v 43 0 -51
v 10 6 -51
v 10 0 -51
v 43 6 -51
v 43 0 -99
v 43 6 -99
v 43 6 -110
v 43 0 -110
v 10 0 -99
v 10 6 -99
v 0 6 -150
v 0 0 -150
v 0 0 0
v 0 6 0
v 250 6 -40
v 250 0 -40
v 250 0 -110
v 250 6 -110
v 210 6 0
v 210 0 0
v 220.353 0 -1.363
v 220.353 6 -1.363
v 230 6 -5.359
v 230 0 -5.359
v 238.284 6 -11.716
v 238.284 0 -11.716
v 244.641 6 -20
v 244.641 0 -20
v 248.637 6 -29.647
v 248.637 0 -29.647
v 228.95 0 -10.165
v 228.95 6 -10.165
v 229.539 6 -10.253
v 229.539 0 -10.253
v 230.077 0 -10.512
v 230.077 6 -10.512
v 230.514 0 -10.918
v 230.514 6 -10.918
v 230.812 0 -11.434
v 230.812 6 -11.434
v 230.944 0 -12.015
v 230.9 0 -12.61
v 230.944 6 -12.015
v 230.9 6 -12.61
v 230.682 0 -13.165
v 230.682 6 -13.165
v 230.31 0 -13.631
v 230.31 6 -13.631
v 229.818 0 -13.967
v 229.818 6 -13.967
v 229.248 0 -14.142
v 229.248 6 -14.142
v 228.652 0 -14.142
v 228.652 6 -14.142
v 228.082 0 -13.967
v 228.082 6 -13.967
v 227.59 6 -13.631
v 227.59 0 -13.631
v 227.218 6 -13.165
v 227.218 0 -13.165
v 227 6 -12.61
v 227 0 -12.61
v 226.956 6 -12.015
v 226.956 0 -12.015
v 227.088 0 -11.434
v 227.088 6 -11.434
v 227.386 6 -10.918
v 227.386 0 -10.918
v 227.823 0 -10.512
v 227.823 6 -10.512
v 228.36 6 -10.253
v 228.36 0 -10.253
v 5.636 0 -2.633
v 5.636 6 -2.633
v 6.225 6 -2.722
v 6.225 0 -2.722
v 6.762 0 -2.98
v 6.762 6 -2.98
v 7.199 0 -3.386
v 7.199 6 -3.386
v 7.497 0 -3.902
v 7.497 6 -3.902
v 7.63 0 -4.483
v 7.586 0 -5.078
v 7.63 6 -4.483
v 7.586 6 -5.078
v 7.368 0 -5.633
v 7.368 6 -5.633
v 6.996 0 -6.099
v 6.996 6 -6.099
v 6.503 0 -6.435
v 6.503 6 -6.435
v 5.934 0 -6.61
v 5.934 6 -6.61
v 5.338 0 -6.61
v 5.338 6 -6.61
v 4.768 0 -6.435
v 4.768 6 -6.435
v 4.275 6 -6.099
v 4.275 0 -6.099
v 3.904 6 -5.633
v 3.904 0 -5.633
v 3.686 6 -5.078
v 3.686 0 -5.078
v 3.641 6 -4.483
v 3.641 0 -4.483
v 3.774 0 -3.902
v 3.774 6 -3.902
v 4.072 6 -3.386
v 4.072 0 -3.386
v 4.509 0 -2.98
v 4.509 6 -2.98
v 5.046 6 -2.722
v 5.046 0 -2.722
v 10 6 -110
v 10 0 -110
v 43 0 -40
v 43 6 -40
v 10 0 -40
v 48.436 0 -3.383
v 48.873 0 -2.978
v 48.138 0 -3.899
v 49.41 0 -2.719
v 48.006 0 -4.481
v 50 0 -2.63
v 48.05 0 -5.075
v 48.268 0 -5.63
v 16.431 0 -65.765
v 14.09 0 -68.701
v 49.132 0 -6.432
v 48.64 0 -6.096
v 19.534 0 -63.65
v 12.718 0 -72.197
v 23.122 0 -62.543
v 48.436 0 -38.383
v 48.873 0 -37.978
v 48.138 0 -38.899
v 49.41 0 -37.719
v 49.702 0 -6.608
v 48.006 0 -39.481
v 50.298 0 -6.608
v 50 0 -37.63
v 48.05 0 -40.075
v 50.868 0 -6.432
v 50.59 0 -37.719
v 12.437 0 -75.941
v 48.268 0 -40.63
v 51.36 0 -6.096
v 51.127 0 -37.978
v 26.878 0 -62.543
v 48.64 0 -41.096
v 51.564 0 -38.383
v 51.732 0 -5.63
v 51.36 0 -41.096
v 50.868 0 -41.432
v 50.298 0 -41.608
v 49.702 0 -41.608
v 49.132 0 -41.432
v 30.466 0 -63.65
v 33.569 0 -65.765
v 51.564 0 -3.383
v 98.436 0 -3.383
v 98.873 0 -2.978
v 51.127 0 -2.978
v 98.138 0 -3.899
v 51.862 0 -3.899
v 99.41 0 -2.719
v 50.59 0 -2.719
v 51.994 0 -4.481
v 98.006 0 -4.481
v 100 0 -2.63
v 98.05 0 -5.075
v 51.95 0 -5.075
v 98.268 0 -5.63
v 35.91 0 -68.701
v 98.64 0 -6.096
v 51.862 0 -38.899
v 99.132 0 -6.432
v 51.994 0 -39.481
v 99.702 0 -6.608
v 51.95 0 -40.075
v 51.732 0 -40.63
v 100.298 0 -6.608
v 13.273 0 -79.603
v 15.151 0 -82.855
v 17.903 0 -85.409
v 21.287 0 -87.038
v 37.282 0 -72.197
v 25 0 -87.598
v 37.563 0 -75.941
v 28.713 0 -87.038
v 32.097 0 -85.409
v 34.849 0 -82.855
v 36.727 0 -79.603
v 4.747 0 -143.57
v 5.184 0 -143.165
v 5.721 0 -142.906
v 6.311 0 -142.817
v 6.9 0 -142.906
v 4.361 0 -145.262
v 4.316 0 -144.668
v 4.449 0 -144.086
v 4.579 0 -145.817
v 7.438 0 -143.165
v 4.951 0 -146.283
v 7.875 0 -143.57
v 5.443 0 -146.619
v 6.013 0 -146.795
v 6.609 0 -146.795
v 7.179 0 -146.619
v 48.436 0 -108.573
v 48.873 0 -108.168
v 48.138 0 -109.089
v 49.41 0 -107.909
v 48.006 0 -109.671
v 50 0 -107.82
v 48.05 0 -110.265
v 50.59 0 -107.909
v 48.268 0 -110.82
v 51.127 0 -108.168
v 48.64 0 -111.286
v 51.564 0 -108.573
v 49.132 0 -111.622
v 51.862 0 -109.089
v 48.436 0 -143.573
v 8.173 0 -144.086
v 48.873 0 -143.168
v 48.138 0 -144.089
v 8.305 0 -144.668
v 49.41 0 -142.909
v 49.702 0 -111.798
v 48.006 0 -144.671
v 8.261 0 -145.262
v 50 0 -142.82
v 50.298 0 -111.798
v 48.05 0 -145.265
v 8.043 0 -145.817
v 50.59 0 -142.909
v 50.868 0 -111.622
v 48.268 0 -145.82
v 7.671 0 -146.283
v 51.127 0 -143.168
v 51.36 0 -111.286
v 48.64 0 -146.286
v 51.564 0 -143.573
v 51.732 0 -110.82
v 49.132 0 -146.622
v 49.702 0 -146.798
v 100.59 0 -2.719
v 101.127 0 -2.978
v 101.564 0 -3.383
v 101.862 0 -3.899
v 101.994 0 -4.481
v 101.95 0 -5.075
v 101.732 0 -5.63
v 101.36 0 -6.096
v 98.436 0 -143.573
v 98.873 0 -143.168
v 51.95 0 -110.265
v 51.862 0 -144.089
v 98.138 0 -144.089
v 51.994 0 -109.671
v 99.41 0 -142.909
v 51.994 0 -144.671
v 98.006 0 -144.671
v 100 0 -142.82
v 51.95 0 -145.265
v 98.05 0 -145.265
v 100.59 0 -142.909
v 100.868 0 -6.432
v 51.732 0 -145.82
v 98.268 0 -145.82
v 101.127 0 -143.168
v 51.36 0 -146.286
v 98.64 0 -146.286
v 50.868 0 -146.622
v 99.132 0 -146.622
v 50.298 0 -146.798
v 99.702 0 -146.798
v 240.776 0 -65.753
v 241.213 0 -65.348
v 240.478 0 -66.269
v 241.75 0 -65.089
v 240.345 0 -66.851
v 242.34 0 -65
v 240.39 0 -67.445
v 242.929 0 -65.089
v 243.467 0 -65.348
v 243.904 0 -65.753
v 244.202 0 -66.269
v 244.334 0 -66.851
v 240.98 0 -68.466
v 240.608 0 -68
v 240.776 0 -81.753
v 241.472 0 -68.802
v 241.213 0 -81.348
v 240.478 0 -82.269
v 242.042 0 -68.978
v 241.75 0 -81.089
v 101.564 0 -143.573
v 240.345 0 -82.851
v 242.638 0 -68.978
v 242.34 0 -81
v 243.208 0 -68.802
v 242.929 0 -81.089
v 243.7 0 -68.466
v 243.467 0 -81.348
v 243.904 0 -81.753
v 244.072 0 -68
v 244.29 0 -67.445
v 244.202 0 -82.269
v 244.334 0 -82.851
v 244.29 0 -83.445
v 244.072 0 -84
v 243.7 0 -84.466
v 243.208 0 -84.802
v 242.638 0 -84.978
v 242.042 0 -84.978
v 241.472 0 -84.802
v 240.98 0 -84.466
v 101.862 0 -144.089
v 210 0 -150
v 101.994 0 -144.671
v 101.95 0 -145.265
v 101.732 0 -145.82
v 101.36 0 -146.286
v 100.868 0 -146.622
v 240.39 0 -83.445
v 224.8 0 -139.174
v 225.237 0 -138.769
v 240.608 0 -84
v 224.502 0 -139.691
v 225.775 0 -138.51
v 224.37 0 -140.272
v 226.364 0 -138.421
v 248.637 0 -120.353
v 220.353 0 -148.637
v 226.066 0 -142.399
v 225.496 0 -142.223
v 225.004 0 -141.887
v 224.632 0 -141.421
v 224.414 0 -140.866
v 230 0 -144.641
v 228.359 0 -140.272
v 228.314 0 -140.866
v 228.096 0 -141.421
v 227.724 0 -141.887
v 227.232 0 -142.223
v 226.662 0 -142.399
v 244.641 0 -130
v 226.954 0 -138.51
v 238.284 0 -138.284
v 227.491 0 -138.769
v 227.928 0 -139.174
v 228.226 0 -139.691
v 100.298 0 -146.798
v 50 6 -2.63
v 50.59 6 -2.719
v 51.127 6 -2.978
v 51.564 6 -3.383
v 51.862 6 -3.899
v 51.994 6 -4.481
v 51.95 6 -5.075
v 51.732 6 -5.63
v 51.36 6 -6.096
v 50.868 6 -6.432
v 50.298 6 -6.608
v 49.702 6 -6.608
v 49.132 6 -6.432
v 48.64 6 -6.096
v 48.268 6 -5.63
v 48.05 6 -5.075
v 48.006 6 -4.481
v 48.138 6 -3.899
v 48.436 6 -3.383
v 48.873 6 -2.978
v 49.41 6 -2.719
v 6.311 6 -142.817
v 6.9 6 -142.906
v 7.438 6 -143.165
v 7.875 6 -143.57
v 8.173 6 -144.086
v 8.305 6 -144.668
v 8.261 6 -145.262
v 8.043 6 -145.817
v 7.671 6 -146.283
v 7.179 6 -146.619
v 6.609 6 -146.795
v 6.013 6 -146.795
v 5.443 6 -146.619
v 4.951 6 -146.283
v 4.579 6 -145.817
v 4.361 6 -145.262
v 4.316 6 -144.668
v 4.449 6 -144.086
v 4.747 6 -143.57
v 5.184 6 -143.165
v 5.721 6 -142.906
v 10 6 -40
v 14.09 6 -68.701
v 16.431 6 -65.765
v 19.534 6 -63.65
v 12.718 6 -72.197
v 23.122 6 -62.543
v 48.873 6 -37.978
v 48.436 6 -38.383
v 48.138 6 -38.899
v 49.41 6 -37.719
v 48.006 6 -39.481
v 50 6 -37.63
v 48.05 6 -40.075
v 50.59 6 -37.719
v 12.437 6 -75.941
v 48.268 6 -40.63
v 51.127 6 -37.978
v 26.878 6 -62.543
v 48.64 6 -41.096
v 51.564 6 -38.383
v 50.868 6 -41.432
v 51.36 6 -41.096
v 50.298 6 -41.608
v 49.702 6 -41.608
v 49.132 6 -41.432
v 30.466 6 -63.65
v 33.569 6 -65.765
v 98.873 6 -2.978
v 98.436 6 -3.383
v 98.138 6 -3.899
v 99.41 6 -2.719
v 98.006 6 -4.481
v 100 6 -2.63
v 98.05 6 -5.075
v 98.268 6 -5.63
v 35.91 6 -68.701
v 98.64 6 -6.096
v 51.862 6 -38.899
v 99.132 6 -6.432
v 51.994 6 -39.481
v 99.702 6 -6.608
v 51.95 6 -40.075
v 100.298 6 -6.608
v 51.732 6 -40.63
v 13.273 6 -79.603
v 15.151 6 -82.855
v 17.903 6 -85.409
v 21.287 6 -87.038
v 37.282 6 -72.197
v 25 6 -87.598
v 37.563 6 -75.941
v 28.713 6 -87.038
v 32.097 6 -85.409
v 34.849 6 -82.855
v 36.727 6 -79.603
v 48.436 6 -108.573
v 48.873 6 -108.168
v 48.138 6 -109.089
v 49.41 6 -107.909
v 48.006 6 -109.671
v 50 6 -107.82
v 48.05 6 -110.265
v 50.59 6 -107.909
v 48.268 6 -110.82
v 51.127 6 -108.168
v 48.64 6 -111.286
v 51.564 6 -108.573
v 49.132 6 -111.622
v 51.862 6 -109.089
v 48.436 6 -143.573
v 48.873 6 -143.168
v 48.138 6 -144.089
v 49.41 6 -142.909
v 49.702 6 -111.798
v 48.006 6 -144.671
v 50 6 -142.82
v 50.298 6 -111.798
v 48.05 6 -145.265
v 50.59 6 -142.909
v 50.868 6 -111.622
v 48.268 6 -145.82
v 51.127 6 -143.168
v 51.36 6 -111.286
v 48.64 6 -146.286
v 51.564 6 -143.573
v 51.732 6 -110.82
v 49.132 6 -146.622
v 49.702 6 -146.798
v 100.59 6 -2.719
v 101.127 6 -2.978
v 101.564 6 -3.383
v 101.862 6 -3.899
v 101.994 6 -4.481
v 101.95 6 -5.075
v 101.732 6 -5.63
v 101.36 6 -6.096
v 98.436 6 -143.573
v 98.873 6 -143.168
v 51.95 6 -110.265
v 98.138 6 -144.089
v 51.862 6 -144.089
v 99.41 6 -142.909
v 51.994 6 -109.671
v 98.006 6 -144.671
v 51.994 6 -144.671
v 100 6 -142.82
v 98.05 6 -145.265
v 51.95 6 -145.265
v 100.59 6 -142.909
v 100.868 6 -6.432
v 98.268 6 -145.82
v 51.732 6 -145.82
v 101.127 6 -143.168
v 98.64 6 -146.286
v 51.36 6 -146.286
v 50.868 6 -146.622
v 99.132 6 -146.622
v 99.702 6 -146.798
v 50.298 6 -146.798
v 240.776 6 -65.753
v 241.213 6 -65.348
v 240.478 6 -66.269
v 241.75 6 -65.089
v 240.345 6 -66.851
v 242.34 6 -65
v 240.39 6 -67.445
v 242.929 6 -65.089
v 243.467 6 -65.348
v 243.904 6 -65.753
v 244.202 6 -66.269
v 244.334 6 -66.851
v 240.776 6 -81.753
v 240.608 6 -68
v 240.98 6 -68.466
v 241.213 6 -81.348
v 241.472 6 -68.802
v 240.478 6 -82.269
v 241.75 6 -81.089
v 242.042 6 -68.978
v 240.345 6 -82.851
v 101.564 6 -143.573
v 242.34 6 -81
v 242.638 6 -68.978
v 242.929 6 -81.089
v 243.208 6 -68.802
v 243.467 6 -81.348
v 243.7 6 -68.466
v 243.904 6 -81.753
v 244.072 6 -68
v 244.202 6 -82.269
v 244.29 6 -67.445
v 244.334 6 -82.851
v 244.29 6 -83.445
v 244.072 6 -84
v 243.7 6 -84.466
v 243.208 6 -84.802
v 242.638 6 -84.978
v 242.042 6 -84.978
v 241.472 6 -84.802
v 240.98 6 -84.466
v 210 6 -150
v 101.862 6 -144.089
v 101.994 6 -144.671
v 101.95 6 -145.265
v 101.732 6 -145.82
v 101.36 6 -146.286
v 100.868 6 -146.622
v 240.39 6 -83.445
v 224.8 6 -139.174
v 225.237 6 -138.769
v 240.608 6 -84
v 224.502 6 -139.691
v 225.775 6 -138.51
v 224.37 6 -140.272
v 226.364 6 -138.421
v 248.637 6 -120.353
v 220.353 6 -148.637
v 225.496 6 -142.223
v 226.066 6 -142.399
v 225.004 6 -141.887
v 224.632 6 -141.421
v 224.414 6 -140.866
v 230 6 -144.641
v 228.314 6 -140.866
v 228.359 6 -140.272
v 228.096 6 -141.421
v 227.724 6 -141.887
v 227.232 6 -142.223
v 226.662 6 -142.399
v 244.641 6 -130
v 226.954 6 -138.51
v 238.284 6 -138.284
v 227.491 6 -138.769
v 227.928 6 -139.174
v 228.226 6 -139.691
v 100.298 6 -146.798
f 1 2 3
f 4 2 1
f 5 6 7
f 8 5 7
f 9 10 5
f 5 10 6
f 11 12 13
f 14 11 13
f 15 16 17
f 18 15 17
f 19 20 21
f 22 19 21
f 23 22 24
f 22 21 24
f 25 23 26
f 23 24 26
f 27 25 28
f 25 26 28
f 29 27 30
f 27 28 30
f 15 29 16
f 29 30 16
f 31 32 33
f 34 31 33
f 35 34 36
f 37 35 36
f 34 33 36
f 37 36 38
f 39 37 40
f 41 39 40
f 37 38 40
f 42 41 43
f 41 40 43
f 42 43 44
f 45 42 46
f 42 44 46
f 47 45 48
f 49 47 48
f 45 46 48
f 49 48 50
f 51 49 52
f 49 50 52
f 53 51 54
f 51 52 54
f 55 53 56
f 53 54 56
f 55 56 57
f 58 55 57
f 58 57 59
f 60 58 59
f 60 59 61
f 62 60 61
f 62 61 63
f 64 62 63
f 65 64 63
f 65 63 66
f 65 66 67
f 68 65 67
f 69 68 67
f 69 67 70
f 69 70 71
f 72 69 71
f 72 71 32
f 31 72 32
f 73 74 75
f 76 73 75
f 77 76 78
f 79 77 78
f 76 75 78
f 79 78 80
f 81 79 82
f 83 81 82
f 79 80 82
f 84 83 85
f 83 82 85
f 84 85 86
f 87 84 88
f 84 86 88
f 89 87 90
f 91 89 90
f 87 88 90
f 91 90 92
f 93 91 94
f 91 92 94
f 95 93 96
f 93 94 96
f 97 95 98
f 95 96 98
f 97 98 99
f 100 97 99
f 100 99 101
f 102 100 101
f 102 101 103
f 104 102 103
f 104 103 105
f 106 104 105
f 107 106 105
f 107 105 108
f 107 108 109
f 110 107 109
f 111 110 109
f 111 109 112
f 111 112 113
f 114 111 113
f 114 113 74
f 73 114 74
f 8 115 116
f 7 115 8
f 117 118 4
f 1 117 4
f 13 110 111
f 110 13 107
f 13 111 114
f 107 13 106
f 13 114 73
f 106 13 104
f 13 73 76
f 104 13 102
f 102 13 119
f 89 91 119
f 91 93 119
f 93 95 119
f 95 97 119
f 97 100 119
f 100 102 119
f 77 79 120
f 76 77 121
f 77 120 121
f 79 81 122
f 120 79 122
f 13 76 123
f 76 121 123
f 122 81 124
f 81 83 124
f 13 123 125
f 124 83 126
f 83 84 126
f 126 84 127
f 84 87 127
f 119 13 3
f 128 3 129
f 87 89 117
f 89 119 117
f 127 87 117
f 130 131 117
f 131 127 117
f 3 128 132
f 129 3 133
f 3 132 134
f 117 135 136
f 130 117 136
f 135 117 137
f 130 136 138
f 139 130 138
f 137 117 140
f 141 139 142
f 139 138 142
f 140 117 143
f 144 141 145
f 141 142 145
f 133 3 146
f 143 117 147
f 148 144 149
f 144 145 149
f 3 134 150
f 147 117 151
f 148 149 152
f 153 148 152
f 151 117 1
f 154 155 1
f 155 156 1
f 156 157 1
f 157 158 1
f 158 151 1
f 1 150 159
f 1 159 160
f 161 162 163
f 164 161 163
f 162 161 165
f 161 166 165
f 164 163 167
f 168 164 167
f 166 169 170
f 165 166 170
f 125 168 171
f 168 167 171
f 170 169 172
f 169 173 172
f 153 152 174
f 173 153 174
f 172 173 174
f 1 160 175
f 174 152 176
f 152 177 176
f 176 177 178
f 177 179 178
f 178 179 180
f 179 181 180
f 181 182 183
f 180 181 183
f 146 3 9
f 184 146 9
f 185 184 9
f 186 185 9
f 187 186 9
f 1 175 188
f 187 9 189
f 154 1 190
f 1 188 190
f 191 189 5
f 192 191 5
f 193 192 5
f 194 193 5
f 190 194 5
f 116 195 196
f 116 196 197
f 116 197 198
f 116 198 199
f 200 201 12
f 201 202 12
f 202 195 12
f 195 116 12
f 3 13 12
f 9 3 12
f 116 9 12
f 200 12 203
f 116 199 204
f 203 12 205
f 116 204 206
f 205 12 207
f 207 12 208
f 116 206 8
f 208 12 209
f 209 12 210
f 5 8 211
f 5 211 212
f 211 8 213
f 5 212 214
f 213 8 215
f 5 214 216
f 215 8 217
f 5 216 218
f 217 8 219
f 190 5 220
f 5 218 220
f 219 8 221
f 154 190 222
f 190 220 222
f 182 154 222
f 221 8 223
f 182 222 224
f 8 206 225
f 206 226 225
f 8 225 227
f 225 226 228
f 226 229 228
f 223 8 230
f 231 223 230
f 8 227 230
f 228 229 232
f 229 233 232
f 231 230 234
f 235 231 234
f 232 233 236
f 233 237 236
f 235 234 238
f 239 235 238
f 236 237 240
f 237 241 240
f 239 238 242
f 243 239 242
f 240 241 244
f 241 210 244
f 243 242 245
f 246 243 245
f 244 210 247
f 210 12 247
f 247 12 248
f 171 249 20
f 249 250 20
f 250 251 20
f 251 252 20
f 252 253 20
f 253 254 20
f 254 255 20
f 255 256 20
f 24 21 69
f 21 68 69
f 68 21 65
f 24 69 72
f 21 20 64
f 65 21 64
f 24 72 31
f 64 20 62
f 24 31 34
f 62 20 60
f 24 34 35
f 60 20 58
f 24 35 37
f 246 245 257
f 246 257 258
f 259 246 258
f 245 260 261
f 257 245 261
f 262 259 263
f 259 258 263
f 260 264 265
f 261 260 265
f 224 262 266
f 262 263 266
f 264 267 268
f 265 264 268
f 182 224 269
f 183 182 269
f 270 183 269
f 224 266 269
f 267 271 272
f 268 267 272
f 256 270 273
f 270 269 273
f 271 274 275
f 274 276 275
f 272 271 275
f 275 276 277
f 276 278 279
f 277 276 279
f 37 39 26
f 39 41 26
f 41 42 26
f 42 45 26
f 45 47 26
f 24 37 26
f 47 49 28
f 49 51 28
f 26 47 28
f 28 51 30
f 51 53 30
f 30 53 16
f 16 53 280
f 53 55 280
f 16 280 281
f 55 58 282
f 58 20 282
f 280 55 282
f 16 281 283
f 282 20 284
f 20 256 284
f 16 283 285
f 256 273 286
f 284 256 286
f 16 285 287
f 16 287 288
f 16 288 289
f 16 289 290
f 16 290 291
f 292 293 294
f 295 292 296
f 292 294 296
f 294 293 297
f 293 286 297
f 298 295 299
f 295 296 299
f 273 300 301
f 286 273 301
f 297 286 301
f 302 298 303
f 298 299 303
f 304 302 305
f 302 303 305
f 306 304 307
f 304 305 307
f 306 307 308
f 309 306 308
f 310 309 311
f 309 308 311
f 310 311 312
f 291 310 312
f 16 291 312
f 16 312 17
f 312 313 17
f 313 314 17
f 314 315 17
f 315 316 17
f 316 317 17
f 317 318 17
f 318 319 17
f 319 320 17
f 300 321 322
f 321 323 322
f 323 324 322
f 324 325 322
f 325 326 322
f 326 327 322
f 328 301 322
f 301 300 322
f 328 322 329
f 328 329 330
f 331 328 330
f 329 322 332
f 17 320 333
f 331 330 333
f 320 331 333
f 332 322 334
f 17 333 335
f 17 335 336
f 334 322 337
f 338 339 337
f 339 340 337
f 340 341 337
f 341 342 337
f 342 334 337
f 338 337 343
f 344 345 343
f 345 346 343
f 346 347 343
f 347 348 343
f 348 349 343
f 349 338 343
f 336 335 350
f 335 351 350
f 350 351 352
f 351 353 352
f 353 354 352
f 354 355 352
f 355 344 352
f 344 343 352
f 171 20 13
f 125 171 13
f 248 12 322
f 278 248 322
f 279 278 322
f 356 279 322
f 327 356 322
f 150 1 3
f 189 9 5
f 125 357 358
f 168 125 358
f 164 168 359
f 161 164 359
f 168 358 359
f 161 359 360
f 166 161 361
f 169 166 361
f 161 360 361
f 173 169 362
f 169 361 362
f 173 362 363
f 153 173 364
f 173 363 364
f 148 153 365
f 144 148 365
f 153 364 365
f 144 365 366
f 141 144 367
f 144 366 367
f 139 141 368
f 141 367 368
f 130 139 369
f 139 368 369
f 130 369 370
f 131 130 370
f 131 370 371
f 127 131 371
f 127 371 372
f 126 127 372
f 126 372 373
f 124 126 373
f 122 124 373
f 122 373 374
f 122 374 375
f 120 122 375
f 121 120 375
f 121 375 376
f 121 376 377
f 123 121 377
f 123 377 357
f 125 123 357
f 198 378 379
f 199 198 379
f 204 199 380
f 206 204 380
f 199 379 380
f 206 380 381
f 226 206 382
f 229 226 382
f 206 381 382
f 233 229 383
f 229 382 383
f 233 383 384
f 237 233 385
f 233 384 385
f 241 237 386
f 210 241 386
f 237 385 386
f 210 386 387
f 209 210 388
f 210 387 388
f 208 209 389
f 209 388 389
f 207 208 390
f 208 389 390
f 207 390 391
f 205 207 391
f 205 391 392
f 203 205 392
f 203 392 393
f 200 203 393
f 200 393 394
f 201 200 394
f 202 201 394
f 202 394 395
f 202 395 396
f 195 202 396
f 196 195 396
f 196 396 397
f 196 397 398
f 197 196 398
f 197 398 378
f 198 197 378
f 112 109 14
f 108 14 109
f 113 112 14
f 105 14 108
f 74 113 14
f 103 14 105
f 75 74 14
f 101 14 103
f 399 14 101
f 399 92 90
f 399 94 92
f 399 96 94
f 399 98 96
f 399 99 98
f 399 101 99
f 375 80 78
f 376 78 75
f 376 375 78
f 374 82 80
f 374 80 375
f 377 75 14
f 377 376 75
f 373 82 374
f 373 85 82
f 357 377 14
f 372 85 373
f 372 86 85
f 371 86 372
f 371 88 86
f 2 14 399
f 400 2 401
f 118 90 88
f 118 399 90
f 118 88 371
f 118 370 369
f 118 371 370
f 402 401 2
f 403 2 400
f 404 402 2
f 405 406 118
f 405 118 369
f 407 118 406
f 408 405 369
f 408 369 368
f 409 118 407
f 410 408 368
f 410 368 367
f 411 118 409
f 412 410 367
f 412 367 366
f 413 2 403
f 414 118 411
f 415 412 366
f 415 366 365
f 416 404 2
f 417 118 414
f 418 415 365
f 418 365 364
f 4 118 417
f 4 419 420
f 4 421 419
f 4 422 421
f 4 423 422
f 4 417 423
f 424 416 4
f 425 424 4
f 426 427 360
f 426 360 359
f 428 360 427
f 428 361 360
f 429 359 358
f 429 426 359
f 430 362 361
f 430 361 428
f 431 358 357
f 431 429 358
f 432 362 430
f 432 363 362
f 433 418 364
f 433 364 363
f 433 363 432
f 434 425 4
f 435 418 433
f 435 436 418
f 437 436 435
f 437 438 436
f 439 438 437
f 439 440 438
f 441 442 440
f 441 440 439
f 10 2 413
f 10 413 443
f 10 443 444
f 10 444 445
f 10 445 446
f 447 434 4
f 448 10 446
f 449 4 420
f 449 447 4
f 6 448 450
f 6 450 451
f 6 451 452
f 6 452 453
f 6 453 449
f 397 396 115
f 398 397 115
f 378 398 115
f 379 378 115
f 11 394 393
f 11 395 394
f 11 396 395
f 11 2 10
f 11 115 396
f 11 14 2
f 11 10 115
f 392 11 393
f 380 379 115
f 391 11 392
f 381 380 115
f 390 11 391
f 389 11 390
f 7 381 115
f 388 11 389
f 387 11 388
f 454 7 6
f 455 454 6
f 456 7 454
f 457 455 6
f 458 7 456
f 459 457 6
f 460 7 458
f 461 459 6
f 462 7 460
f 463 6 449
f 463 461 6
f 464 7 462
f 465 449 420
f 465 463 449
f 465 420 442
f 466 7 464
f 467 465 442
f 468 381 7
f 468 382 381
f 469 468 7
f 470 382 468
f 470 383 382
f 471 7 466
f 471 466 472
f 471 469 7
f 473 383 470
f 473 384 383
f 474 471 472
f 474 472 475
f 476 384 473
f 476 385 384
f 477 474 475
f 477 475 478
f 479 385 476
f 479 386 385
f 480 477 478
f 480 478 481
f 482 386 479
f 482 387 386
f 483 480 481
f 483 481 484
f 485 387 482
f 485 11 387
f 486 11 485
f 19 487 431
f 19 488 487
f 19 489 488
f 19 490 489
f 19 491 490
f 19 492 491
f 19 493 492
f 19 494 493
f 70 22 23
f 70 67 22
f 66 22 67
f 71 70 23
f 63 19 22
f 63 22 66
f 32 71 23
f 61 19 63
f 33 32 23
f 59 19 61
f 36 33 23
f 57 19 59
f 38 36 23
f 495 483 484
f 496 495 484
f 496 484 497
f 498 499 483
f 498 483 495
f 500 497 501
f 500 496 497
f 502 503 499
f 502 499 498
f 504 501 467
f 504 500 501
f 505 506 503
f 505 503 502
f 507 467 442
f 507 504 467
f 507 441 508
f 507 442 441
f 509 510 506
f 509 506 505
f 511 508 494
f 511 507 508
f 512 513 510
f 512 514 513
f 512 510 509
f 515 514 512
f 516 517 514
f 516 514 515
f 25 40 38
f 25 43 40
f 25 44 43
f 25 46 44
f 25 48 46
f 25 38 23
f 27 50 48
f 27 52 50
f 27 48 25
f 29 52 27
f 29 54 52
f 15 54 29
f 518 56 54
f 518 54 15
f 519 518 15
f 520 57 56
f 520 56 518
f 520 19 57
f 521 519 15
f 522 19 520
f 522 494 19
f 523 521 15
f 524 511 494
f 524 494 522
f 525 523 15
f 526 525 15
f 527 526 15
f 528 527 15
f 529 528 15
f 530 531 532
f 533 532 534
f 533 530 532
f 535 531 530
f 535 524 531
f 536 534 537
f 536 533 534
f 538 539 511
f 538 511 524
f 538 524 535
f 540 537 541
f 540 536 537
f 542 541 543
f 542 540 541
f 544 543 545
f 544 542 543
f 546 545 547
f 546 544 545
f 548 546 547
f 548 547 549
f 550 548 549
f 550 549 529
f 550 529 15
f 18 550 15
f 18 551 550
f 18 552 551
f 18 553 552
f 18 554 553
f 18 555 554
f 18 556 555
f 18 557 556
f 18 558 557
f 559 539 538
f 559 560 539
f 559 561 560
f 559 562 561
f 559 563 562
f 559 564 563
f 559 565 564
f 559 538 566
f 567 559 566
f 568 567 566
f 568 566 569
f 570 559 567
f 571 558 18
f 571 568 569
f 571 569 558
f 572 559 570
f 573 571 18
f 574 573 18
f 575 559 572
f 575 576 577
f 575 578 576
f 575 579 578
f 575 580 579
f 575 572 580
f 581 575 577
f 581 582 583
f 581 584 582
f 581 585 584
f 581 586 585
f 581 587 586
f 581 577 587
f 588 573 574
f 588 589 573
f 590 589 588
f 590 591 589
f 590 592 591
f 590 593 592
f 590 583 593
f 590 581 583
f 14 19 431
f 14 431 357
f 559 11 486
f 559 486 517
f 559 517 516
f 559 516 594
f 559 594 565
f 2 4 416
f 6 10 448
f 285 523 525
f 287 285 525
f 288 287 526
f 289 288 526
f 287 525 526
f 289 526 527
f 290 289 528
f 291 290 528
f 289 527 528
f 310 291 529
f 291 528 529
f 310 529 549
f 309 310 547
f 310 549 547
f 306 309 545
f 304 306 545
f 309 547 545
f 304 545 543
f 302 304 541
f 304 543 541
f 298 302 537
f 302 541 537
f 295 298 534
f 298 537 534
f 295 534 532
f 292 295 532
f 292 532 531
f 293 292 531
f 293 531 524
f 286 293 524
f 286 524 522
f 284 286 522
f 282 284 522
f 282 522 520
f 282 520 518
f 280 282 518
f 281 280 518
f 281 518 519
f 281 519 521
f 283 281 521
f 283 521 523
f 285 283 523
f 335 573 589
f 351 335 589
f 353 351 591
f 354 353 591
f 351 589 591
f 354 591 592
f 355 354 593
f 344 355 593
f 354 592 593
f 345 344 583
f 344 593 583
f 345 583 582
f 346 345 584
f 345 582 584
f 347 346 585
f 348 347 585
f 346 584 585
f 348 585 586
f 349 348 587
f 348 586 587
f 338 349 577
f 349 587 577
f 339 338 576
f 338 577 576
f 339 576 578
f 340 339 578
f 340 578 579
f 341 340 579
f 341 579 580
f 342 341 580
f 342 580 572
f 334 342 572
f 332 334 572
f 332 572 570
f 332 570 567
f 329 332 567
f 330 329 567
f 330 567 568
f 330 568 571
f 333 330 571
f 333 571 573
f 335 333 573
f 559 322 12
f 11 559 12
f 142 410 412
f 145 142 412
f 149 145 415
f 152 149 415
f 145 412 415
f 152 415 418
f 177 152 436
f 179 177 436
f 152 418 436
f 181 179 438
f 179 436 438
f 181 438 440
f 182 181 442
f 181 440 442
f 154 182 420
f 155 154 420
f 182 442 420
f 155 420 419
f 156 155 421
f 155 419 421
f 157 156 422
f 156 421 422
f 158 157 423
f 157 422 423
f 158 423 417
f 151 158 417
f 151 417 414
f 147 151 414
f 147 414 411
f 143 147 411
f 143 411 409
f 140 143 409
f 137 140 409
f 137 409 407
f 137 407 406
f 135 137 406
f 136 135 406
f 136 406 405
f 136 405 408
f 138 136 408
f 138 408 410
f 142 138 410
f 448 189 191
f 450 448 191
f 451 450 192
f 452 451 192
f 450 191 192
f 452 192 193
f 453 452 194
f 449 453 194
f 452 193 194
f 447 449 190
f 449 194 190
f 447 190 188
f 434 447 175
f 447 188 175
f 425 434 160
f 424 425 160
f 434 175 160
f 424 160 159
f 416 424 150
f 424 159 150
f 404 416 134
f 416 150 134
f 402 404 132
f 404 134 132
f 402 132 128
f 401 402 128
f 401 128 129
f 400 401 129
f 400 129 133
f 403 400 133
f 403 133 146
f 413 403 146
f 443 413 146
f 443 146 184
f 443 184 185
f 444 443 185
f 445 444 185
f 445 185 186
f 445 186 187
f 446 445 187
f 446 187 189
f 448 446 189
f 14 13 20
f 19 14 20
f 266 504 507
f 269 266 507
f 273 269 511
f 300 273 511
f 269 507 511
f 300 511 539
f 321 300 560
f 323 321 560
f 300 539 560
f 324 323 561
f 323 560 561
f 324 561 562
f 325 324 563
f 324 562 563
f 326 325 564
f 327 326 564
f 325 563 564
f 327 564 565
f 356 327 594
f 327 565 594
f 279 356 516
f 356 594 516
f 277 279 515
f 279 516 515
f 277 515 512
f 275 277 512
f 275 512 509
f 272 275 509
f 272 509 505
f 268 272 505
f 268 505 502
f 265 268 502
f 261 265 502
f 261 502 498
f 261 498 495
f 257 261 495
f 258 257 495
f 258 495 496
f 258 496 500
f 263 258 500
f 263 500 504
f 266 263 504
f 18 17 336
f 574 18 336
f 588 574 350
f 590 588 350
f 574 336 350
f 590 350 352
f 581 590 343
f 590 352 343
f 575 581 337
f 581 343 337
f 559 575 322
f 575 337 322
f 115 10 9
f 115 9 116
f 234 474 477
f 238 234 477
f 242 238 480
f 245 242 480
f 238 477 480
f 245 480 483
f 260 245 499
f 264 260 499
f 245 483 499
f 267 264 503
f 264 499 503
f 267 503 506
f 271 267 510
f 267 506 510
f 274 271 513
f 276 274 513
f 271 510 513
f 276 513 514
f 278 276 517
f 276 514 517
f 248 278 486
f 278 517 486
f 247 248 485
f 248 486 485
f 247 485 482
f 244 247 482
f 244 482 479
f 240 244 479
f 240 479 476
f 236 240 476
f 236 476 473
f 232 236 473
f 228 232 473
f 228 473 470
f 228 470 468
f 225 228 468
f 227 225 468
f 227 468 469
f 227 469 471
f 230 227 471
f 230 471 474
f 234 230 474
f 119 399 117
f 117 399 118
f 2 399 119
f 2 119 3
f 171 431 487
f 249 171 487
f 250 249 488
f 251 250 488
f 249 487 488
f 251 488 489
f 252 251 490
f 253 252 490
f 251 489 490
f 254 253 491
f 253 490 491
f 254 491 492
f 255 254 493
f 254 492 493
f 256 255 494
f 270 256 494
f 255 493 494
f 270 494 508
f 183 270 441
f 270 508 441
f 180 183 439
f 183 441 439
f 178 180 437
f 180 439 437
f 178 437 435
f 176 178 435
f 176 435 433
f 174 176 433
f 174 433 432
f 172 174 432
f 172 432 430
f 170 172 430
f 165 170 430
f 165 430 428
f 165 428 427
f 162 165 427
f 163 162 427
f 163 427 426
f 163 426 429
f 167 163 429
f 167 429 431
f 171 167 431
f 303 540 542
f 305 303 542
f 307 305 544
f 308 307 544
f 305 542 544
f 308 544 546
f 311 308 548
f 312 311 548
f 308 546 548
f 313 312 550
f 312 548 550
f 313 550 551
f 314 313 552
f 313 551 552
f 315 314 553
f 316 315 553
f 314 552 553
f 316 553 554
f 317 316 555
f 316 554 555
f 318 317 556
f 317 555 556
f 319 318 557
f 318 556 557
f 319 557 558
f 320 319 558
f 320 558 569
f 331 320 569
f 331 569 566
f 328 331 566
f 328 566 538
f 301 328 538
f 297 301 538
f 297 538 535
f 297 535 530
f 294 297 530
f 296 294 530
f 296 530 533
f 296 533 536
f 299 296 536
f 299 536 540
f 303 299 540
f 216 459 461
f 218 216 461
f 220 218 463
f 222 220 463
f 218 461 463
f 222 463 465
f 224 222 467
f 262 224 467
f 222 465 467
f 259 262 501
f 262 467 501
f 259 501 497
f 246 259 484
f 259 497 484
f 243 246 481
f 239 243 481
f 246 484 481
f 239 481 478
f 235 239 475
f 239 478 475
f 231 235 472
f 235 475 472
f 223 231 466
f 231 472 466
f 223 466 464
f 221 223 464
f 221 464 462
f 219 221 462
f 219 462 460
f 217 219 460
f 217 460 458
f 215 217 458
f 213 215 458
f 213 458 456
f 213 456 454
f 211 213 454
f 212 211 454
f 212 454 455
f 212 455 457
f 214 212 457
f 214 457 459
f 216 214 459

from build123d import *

# Parameters (mm, degrees)
BOSS_EXTRUDE1_DEPTH = 6
SKETCH2_R           = 12.59794853
CUT_EXTRUDE1_DEPTH  = 292.609327697
SKETCH3_R           = 2
CUT_EXTRUDE10_DEPTH = 292.609327697
SKETCH4_R           = 2
CUT_EXTRUDE11_DEPTH = 292.609327697
SKETCH5_R           = 2
CUT_EXTRUDE12_DEPTH = 292.609327697
SKETCH6_R           = 2
CUT_EXTRUDE13_DEPTH = 292.609327697
SKETCH8_R           = 2
CUT_EXTRUDE14_DEPTH = 292.609327697
SKETCH10_R          = 2
CUT_EXTRUDE15_DEPTH = 292.609327697
SKETCH13_W          = 33
SKETCH13_H          = 11
CUT_EXTRUDE16_DEPTH = 292.609327697


with BuildPart() as part:
    # Sketch1 → Boss-Extrude1 (new body)
    with BuildSketch(Plane(origin=(0, 0, 0), x_dir=(1, 0, 0), z_dir=(0, 1, 0))):
        with BuildLine():
            Line((0, 0), (210, 0))
            ThreePointArc((210, 0), (238.284271247, 11.715728753), (250, 40))
            Line((250, 40), (250, 110))
            ThreePointArc((250, 110), (238.284271247, 138.284271247), (210, 150))
            Line((210, 150), (0, 150))
            Line((0, 150), (0, 0))
        make_face()
    extrude(amount=BOSS_EXTRUDE1_DEPTH)

    # Sketch2 → Cut-Extrude1 (cut, through all)
    with BuildSketch(Plane.XZ):
        with Locations(Location((25, -75, 0), (0, 0, 270))):
            Circle(SKETCH2_R)
    extrude(amount=-CUT_EXTRUDE1_DEPTH, mode=Mode.SUBTRACT)

    # Sketch3 → Cut-Extrude10 (cut, through all)
    with BuildSketch(Plane(origin=(0, 6, 0), x_dir=(1, 0, 0), z_dir=(0, 1, 0))):
        with Locations(Location((6.310878228, 144.817130454, 0), (0, 0, 270))):
            Circle(SKETCH3_R)
    extrude(amount=-CUT_EXTRUDE10_DEPTH, mode=Mode.SUBTRACT)

    # Sketch4 → Cut-Extrude11 (cut, through all)
    with BuildSketch(Plane(origin=(0, 6, 0), x_dir=(1, 0, 0), z_dir=(0, 1, 0))):
        with Locations(Location((5.635720357, 4.632829204, 0), (0, 0, 270))):
            Circle(SKETCH4_R)
    extrude(amount=-CUT_EXTRUDE11_DEPTH, mode=Mode.SUBTRACT)

    # Sketch5 → Cut-Extrude12 (cut, through all)
    with BuildSketch(Plane(origin=(0, 6, 0), x_dir=(1, 0, 0), z_dir=(0, 1, 0))):
        with Locations(Location((226.364130141, 140.421237055, 0), (0, 0, 270))):
            Circle(SKETCH5_R)
    extrude(amount=-CUT_EXTRUDE12_DEPTH, mode=Mode.SUBTRACT)

    # Sketch6 → Cut-Extrude13 (cut, through all)
    with BuildSketch(Plane(origin=(0, 6, 0), x_dir=(1, 0, 0), z_dir=(0, 1, 0))):
        with Locations(Location((228.949949788, 12.164582591, 0), (0, 0, 270))):
            Circle(SKETCH6_R)
    extrude(amount=-CUT_EXTRUDE13_DEPTH, mode=Mode.SUBTRACT)

    # Sketch8 → Cut-Extrude14 (cut, through all)
    with BuildSketch(Plane(origin=(0, 6, 0), x_dir=(1, 0, 0), z_dir=(0, 1, 0))):
        with Locations(Location((242.339859996, 83, 0), (0, 0, 270))):
            Circle(SKETCH8_R)
        with Locations(Location((242.339859996, 67, 0), (0, 0, 270))):
            Circle(SKETCH8_R)
    extrude(amount=-CUT_EXTRUDE14_DEPTH, mode=Mode.SUBTRACT)

    # Sketch10 → Cut-Extrude15 (cut, through all)
    with BuildSketch(Plane(origin=(0, 6, 0), x_dir=(1, 0, 0), z_dir=(0, 1, 0))):
        with Locations(Location((50, 144.82, 0), (0, 0, 270))):
            Circle(SKETCH10_R)
        with Locations(Location((50, 4.63, 0), (0, 0, 270))):
            Circle(SKETCH10_R)
        with Locations(Location((100, 4.63, 0), (0, 0, 270))):
            Circle(SKETCH10_R)
        with Locations(Location((100, 144.82, 0), (0, 0, 270))):
            Circle(SKETCH10_R)
        with Locations(Location((50, 109.82, 0), (0, 0, 270))):
            Circle(SKETCH10_R)
        with Locations(Location((50, 39.63, 0), (0, 0, 270))):
            Circle(SKETCH10_R)
    extrude(amount=-CUT_EXTRUDE15_DEPTH, mode=Mode.SUBTRACT)

    # Sketch13 → Cut-Extrude16 (cut, through all)
    with BuildSketch(Plane(origin=(0, 6, 0), x_dir=(1, 0, 0), z_dir=(0, 1, 0))):
        with Locations((26.5, 104.5)):
            Rectangle(SKETCH13_W, SKETCH13_H)
        with Locations((26.5, 45.5)):
            Rectangle(SKETCH13_W, SKETCH13_H)
    extrude(amount=-CUT_EXTRUDE16_DEPTH, mode=Mode.SUBTRACT)


solid = part.part
